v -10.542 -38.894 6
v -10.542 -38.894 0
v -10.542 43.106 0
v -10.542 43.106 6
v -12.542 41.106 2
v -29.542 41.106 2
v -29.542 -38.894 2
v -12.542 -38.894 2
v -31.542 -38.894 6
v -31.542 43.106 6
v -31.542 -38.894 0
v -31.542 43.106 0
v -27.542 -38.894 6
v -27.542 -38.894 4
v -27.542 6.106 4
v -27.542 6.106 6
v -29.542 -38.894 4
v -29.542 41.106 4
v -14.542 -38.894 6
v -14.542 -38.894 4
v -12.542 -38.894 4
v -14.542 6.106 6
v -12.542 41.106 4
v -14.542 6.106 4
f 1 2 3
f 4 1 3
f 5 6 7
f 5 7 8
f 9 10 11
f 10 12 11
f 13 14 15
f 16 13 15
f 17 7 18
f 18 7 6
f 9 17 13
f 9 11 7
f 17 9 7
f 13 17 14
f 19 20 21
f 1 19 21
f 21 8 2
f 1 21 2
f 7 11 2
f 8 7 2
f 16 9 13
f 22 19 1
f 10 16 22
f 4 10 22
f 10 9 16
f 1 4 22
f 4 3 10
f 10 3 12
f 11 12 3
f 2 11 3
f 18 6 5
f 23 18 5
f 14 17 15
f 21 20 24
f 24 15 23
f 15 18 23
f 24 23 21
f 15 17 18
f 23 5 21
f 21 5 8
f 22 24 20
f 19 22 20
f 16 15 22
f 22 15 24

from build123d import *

# Parameters (mm, degrees)
F0_W     = 21
F0_H     = 82
F1_DEPTH = 2
F3_DEPTH = 2
F6_DEPTH = 2


with BuildPart() as f1:
    # F0 (on Top) → F1 (new body)
    with BuildSketch(Plane.XY):
        with Locations((-21.0416306257, 2.1058048904)):
            Rectangle(F0_W, F0_H)
    extrude(amount=F1_DEPTH)

    # F2 (on face) → F3 (join)
    with BuildSketch(Plane.XY.offset(2)):
        Polygon((-12.5416306257, -38.8941951096), (-10.5416306257, -38.8941951096), (-10.5416306257, 43.1058048904), (-31.5416306257, 43.1058048904), (-31.5416306257, -38.8941951096), (-29.5416306257, -38.8941951096), (-29.5416306257, 41.1058048904), (-12.5416306257, 41.1058048904), align=None)
    extrude(amount=F3_DEPTH)

    # F5 (on offset) → F6 (join)
    with BuildSketch(Plane.XY.offset(4)):
        Polygon((-10.5416306257, 8.1058048904), (-10.5416306257, 43.1058048904), (-31.5416306257, 43.1058048904), (-31.5416306257, 8.1058048904), (-31.5416306257, 0), (-31.5416306257, -38.8941951096), (-27.5416306257, -38.8941951096), (-27.5416306257, 6.1058048904), (-14.5416306257, 6.1058048904), (-14.5416306257, -38.8941951096), (-10.5416306257, -38.8941951096), align=None)
    extrude(amount=F6_DEPTH)


solid = f1.part
